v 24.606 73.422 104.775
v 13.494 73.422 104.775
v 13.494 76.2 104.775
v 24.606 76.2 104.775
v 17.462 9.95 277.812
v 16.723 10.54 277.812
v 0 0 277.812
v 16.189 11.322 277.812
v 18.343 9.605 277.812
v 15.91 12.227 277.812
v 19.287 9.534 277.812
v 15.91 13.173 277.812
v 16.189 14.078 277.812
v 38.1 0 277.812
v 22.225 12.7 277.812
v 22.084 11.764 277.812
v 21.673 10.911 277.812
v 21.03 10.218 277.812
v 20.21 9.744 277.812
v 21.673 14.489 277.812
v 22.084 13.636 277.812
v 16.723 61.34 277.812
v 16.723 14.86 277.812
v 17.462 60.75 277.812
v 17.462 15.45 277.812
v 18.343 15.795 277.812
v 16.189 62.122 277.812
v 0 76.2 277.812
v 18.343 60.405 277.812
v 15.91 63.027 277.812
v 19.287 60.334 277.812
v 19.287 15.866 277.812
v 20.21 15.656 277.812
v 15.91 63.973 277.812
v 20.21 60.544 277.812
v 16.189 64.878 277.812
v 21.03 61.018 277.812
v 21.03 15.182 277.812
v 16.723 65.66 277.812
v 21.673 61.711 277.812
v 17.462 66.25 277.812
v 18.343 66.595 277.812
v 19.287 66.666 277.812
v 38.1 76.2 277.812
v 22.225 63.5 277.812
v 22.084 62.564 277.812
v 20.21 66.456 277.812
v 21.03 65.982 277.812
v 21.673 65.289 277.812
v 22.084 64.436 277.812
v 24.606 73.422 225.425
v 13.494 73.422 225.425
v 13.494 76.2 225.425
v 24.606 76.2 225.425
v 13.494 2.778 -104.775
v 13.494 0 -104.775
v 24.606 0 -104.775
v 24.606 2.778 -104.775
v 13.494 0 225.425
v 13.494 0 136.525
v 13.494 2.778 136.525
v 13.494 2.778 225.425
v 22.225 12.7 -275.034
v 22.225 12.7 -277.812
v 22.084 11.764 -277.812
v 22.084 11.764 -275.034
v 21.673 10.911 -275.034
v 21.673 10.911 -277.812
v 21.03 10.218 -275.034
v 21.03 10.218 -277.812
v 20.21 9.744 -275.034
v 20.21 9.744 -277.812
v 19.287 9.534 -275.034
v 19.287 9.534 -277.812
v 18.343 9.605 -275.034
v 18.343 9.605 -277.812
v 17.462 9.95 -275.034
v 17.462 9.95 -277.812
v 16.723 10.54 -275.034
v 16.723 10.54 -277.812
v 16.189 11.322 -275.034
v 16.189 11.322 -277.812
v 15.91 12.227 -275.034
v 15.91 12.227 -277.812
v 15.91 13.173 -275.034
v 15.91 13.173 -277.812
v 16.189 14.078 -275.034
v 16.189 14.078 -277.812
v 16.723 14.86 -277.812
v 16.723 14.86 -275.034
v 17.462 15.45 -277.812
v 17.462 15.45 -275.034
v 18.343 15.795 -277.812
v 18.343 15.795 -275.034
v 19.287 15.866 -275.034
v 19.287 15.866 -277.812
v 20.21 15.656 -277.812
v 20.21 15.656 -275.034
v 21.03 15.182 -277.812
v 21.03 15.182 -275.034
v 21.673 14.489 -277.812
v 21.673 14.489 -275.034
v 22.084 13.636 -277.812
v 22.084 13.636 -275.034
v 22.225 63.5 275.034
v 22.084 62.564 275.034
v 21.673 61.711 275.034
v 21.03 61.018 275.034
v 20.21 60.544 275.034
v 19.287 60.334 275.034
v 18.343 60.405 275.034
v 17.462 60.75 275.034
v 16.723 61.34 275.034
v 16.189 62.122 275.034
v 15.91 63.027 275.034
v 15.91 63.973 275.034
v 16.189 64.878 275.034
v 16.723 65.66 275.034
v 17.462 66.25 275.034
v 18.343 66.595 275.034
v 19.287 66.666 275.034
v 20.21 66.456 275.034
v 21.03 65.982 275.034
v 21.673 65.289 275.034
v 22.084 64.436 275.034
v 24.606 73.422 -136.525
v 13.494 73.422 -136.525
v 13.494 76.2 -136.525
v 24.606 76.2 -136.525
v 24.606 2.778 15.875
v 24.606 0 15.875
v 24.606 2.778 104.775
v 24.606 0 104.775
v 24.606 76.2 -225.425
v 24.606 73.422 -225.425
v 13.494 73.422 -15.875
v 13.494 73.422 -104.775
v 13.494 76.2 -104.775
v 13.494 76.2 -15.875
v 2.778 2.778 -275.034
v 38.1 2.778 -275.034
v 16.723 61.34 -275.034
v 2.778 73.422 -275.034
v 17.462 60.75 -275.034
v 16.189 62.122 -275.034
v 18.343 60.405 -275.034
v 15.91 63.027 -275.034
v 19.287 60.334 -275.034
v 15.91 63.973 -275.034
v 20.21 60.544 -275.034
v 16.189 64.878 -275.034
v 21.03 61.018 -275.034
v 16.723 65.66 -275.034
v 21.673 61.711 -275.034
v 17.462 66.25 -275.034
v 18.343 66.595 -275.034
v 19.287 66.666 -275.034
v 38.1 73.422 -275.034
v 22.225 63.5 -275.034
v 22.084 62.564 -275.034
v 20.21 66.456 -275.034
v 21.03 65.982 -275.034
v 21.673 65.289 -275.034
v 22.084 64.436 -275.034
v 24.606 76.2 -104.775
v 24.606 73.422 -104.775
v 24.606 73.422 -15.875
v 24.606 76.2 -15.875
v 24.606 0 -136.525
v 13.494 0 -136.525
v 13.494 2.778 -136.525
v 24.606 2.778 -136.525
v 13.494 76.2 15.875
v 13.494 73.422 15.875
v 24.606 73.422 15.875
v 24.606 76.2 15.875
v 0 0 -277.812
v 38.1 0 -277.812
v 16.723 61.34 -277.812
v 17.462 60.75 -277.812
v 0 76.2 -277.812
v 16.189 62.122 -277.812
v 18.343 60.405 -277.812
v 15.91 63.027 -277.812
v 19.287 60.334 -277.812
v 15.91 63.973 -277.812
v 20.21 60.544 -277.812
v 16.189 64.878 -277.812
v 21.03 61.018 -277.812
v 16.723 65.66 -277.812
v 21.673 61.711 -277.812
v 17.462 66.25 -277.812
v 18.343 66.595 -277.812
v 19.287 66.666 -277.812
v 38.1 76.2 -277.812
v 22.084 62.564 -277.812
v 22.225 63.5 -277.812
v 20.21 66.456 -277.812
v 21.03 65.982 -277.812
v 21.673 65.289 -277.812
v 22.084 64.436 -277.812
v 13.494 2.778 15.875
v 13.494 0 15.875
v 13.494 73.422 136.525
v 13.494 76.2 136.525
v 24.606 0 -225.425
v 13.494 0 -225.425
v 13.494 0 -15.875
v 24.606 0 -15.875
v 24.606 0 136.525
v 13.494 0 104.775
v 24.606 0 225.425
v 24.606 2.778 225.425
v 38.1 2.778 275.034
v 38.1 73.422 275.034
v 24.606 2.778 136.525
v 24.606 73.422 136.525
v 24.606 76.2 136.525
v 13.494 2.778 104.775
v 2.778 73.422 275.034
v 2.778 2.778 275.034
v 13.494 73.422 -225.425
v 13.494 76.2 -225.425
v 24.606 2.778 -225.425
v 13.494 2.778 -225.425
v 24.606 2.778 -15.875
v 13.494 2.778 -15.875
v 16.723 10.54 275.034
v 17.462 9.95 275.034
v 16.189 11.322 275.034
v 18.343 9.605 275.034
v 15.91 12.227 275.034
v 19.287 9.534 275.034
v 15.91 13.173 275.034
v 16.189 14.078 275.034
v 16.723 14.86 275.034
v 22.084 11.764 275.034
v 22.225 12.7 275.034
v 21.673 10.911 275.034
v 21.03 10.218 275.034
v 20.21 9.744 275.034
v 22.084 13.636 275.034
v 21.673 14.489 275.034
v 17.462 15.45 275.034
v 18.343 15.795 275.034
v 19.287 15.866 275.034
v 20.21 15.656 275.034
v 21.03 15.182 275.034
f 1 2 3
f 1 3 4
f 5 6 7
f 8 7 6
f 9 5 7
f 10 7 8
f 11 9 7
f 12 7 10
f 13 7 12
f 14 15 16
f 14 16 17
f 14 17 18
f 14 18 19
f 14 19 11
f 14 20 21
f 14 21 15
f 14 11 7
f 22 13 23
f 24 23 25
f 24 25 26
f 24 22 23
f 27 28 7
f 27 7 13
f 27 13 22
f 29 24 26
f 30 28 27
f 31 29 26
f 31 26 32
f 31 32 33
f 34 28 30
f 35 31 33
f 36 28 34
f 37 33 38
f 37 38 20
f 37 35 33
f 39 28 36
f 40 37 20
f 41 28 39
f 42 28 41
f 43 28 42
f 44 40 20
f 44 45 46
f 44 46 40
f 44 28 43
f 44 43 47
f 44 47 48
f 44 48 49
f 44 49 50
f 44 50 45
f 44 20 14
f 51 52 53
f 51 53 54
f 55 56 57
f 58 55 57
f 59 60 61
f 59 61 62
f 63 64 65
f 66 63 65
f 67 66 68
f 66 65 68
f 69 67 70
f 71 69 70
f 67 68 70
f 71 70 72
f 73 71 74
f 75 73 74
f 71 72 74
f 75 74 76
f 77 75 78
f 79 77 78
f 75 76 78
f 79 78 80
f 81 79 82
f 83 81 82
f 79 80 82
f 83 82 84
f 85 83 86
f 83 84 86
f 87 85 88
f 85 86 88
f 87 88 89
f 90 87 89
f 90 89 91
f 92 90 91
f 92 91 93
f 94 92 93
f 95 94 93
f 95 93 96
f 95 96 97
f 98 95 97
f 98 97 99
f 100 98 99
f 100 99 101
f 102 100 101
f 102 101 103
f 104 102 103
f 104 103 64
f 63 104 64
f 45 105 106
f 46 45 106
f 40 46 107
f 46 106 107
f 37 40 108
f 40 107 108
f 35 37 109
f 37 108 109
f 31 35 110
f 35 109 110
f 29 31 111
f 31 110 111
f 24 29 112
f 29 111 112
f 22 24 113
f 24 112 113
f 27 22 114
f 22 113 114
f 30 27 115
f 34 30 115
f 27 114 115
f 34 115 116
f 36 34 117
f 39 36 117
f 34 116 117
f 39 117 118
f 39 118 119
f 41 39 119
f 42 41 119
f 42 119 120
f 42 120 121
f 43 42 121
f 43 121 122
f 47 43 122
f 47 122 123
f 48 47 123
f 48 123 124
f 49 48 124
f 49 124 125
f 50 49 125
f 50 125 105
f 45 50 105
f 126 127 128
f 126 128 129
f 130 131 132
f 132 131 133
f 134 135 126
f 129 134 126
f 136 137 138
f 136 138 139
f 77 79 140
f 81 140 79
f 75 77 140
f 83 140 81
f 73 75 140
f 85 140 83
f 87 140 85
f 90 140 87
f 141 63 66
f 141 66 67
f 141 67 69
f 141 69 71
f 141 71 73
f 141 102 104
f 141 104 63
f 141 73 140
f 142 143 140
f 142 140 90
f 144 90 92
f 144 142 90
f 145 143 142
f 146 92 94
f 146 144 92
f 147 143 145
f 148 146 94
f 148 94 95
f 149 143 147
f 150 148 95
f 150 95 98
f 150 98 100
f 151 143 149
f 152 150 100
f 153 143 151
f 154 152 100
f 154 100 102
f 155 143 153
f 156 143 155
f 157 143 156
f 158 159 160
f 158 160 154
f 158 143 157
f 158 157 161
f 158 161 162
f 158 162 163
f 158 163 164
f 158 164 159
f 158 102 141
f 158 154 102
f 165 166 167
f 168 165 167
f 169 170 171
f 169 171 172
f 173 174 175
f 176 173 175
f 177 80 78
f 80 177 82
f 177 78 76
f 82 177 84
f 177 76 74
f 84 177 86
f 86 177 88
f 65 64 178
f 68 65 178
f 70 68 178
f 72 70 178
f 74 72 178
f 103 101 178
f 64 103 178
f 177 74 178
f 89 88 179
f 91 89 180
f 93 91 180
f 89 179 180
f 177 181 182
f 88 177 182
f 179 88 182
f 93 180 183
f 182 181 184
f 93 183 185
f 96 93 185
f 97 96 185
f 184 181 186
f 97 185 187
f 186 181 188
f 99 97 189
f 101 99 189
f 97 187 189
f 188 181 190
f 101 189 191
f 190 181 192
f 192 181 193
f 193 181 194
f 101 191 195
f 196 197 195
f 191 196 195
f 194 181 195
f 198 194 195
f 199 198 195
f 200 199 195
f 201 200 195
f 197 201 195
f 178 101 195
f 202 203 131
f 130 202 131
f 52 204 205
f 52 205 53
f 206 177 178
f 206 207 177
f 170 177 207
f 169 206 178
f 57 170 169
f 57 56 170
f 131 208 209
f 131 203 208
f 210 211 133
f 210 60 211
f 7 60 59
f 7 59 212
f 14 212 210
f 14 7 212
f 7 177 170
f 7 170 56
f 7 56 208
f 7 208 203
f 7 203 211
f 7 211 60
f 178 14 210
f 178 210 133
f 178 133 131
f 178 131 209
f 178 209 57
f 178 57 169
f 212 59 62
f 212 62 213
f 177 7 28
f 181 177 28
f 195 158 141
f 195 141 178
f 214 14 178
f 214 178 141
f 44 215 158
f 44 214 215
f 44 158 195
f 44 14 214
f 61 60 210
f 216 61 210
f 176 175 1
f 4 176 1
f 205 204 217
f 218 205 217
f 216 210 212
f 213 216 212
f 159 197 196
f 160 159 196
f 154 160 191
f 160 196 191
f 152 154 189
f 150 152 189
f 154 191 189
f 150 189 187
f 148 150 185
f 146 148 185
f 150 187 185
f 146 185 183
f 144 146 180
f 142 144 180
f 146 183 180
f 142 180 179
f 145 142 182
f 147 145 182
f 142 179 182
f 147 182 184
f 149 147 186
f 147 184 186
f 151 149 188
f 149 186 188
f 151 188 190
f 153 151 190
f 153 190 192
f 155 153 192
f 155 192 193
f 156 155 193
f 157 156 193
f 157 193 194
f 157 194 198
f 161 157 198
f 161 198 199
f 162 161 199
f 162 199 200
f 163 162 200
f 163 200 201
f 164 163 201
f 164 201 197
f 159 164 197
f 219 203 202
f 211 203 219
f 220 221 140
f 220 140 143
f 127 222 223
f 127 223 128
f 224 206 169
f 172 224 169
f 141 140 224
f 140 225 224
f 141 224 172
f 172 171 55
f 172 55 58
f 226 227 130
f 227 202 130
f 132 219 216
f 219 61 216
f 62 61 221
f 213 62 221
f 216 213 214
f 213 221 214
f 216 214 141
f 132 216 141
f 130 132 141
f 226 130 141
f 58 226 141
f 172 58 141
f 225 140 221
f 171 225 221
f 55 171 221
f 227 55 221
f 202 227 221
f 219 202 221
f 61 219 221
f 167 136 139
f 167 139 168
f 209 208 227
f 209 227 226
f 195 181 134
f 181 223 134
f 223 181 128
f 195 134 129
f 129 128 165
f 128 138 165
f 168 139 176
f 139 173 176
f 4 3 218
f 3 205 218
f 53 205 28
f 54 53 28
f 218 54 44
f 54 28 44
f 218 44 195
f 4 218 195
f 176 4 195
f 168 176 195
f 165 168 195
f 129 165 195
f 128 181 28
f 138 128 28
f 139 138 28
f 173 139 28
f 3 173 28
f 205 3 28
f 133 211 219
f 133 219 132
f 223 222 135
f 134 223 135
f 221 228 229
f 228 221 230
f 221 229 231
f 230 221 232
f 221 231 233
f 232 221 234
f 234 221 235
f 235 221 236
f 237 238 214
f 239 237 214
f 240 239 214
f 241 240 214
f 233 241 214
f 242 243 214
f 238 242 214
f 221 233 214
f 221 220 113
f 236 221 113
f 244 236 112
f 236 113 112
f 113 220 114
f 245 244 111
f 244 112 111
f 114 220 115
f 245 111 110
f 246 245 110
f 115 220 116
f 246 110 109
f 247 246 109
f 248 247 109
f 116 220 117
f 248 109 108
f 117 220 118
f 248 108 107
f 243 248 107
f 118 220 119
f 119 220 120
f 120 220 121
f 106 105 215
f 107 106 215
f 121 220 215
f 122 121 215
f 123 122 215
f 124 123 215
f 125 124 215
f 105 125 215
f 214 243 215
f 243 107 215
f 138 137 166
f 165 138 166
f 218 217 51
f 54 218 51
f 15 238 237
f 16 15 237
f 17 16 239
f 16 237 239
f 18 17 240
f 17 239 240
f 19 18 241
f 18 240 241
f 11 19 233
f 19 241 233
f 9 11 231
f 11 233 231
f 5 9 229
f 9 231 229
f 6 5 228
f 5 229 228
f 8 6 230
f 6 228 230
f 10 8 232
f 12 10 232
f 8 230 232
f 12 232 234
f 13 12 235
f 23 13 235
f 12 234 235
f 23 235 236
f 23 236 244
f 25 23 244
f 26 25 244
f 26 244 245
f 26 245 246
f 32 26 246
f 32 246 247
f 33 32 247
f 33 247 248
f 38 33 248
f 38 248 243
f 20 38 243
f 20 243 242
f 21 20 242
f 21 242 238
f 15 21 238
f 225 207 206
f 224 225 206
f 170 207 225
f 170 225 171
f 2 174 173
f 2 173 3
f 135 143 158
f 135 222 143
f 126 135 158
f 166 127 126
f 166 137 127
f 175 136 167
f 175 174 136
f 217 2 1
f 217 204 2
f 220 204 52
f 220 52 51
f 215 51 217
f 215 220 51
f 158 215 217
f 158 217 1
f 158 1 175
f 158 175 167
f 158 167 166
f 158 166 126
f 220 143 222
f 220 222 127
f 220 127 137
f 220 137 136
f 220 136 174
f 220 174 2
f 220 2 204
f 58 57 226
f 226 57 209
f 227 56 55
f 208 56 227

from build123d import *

# Parameters (mm, degrees)
F0_W     = 38.1
F0_H     = 76.2
F1_DEPTH = 277.8125
F2_T     = -2.778125
F3_R     = 3.175
F4_DEPTH = 555.626
F5_W     = 11.1125
F5_H     = 88.9
F6_DEPTH = 76.201


with BuildPart() as f1:
    # F0 (on Top) → F1 (new body, symmetric)
    with BuildSketch(Plane.XY):
        with Locations((19.05, 38.1)):
            Rectangle(F0_W, F0_H)
    extrude(amount=F1_DEPTH, both=True)

    # F2
    f2_openings = [f1.faces().sort_by_distance(p)[0] for p in [
        (38.1, 38.1, 0),
    ]]
    offset(amount=F2_T, openings=f2_openings)

    # F3 (on face) → F4 (cut, through all)
    with BuildSketch(Plane(origin=(0, 0, -277.8125), x_dir=(1, 0, 0), z_dir=(0, 0, -1))):
        with Locations((19.05, -12.7)):
            Circle(F3_R)
        with Locations((19.05, -63.5)):
            Circle(F3_R)
    extrude(amount=-F4_DEPTH, mode=Mode.SUBTRACT)

    # F5 (on face) → F6 (cut, through all)
    with BuildSketch(Plane.XZ):
        with Locations((19.05, -180.975)):
            Rectangle(F5_W, F5_H)
        with Locations((19.05, -60.325)):
            Rectangle(F5_W, F5_H)
        with Locations((19.05, 60.325)):
            Rectangle(F5_W, F5_H)
        with Locations((19.05, 180.975)):
            Rectangle(F5_W, F5_H)
    extrude(amount=-F6_DEPTH, mode=Mode.SUBTRACT)


solid = f1.part
